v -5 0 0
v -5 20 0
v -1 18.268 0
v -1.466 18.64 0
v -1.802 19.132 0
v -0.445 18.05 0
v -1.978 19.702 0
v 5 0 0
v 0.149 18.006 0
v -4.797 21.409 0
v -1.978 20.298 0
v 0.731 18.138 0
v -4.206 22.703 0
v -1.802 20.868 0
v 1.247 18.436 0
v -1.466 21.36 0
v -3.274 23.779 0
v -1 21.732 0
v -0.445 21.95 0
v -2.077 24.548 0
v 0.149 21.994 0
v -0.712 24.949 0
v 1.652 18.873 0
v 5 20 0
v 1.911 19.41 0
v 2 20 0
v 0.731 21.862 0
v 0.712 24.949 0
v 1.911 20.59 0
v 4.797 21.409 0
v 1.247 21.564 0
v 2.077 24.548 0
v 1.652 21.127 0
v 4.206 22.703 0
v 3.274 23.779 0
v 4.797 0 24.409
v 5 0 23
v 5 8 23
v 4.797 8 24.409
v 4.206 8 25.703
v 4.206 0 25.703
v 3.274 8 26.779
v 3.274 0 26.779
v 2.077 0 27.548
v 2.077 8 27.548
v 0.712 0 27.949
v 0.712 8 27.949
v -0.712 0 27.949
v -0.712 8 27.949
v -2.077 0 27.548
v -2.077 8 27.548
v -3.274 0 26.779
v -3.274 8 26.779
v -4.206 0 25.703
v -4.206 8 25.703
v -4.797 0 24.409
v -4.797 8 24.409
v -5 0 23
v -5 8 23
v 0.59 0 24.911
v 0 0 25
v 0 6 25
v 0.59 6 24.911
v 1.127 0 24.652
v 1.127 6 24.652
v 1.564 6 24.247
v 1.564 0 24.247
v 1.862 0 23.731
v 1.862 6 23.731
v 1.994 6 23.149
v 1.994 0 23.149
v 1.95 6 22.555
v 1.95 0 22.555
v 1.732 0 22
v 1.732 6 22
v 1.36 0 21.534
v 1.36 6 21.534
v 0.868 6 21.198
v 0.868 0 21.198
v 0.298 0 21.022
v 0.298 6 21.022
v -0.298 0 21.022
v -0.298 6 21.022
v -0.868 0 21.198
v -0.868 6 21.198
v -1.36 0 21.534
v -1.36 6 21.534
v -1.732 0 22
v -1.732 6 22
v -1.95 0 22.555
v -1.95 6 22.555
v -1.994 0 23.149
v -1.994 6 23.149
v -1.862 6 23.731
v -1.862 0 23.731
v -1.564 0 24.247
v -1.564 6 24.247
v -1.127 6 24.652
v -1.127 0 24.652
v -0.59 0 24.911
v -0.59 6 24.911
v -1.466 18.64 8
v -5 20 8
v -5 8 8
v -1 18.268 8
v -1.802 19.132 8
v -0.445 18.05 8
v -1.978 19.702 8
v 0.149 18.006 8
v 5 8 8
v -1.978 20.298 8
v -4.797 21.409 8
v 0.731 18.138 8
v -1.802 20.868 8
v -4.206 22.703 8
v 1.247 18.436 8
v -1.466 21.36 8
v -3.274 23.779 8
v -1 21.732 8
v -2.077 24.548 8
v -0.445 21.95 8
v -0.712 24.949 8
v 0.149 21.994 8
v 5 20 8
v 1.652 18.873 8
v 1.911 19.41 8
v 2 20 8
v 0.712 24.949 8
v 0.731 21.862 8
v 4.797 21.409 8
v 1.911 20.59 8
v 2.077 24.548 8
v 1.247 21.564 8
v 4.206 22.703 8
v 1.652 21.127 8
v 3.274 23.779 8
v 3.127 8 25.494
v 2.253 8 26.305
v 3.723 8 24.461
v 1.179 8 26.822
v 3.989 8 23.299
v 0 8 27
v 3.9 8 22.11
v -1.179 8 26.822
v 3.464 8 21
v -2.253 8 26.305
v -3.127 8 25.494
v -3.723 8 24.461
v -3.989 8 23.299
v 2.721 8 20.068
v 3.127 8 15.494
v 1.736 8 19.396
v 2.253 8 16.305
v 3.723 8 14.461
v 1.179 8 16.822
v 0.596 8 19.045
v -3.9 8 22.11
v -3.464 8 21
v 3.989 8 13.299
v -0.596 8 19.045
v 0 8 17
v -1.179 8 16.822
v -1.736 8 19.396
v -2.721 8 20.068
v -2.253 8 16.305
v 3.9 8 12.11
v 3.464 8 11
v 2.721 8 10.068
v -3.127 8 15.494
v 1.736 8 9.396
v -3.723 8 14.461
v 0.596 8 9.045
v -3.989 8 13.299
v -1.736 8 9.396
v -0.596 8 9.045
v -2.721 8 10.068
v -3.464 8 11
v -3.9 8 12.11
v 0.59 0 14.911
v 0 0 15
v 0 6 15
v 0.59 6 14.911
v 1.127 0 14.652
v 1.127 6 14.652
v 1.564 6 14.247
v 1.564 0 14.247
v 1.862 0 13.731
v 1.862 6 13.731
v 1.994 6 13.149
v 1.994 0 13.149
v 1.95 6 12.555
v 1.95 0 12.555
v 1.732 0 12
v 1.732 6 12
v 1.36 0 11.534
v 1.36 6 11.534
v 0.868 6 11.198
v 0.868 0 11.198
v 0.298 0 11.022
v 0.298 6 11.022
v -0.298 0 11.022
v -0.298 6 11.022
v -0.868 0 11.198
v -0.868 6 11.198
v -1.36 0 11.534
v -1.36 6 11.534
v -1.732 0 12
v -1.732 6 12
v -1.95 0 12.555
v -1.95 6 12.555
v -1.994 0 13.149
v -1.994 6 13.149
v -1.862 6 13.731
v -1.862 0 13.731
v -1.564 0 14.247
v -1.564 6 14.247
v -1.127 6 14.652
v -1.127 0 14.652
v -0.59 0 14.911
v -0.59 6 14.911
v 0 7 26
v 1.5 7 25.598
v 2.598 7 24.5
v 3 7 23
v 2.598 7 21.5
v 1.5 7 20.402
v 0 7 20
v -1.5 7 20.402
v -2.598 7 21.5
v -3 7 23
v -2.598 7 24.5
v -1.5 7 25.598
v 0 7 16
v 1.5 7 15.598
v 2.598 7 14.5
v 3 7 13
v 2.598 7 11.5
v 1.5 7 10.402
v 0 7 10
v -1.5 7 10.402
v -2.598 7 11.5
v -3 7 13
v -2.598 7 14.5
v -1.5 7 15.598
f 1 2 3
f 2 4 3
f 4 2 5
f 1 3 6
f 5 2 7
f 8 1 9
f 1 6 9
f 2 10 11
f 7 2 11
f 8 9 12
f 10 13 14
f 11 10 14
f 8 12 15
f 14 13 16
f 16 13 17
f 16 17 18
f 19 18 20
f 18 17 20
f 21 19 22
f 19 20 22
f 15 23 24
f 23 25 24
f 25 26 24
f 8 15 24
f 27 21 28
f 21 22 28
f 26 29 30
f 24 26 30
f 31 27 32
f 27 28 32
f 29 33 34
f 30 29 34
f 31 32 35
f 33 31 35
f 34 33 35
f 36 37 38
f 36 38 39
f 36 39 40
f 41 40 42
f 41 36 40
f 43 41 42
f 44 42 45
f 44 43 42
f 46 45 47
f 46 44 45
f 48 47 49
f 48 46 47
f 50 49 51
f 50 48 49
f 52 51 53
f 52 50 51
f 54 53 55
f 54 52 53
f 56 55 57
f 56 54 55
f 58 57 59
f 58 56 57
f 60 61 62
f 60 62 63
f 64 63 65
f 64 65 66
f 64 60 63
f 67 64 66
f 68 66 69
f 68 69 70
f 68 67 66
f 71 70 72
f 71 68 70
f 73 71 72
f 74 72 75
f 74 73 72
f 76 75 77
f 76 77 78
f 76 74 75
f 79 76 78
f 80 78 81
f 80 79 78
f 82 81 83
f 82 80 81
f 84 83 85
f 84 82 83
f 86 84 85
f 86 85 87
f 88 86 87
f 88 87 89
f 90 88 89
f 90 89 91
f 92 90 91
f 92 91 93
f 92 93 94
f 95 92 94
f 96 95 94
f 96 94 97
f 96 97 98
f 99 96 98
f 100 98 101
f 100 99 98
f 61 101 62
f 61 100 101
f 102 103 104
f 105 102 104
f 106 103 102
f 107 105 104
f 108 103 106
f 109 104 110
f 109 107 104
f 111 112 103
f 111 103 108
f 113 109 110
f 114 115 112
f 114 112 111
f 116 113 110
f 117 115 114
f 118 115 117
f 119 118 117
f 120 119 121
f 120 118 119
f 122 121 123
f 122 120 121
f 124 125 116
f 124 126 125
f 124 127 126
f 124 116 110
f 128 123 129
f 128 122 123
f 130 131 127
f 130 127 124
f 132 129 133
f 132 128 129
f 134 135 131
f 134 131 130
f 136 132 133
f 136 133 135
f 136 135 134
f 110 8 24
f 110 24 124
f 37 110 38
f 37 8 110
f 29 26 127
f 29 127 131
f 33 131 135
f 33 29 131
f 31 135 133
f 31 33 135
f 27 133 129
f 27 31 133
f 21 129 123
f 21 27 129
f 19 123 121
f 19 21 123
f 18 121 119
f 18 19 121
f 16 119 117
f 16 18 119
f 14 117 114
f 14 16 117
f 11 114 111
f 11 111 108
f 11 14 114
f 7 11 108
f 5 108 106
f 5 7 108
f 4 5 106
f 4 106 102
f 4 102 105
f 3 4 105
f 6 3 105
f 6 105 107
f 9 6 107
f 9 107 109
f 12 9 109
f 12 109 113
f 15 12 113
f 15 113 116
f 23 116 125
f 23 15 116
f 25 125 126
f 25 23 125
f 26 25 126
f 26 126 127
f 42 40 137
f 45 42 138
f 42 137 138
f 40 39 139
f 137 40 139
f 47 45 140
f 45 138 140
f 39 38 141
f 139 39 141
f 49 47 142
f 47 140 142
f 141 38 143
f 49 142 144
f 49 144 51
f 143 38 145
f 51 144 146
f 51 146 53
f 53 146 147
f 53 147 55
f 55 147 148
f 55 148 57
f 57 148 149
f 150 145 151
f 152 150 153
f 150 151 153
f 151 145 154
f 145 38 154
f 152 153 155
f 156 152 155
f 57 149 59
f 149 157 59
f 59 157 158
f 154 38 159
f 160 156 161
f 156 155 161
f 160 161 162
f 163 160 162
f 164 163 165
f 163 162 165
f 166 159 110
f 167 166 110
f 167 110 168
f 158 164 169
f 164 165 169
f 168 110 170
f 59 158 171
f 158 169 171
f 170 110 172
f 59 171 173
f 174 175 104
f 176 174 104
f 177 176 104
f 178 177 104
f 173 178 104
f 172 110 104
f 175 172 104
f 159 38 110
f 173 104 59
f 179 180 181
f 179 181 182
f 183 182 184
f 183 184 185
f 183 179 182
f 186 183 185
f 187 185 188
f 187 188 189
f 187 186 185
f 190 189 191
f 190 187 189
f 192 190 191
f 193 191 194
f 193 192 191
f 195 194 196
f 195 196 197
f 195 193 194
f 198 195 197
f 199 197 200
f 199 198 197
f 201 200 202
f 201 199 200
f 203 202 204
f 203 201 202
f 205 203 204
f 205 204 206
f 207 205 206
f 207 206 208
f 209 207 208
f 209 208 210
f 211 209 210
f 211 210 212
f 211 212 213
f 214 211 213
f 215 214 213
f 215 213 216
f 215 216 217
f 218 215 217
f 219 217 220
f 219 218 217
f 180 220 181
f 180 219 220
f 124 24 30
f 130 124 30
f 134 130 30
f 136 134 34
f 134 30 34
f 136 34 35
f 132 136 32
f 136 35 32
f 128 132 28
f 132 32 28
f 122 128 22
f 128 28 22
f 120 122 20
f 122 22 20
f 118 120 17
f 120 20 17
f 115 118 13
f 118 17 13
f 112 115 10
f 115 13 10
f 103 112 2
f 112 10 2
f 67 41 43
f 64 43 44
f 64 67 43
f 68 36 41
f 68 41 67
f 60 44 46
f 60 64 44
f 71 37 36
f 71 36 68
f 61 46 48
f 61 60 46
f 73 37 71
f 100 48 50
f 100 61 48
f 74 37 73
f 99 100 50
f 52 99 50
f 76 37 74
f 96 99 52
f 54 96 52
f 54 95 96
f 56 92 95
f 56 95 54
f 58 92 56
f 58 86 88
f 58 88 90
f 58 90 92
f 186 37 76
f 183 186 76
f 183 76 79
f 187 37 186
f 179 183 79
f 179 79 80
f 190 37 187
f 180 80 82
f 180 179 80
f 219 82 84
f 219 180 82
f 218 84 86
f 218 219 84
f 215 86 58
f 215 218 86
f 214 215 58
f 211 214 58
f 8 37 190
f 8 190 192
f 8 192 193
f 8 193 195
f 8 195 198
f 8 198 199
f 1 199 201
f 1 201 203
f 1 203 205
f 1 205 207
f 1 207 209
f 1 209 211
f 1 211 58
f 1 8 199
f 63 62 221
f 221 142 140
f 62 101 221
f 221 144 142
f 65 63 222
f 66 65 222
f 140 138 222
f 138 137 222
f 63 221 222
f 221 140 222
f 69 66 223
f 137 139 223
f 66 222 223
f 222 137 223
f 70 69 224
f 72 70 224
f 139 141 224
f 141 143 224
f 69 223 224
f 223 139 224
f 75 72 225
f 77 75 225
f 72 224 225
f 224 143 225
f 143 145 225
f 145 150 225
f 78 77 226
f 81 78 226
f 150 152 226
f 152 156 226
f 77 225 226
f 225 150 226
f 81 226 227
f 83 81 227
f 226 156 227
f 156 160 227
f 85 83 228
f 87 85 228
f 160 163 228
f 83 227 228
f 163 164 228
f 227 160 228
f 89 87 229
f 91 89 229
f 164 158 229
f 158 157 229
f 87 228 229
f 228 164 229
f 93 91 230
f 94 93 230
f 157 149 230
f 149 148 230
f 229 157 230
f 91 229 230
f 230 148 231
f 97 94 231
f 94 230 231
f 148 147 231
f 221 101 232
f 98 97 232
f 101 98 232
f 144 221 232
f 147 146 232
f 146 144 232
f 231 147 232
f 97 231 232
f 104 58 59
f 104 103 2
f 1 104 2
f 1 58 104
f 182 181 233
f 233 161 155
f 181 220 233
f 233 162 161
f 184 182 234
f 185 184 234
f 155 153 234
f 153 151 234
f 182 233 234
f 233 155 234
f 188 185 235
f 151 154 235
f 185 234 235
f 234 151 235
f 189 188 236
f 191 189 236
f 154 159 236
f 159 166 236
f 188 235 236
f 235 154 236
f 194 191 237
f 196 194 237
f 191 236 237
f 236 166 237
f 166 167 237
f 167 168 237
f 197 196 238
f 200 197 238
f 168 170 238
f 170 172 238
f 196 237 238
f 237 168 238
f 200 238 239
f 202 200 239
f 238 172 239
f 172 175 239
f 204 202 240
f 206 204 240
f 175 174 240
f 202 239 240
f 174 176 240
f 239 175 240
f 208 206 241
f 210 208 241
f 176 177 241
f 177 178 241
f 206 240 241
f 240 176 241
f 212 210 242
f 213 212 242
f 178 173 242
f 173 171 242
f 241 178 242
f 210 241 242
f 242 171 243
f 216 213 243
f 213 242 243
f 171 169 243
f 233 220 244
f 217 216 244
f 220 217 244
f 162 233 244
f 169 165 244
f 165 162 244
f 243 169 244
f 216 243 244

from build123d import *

# Parameters (mm, degrees)
SKETCH_1_R      = 2
EXTRUDE_1_DEPTH = 8
SKETCH_2_R      = 2
EXTRUDE_2_DEPTH = 8
CHAMFER_1_SIZE  = 2


with BuildPart() as part:
    # 草图1 → 凸台-拉伸1 (new body)
    with BuildSketch(Plane.XY):
        with BuildLine():
            Line((-5, 20), (-5, 0))
            Line((-5, 0), (5, 0))
            Line((5, 0), (5, 20))
            ThreePointArc((5, 20), (0, 25), (-5, 20))
        make_face()
        with Locations((0, 20)):
            Circle(SKETCH_1_R, mode=Mode.SUBTRACT)
    extrude(amount=EXTRUDE_1_DEPTH)

    # 草图2 → 凸台-拉伸2 (add)
    with BuildSketch(Plane(origin=(0, 0, 0), x_dir=(1, 0, 0), z_dir=(0, 1, 0))):
        with BuildLine():
            Line((-5, -8), (5, -8))
            Line((5, -8), (5, -23))
            ThreePointArc((5, -23), (0, -28), (-5, -23))
            Line((-5, -23), (-5, -8))
        make_face()
        with Locations(Location((0, -23, 0), (0, 0, 270))):
            Circle(SKETCH_2_R, mode=Mode.SUBTRACT)
        with Locations(Location((0, -13, 0), (0, 0, 270))):
            Circle(SKETCH_2_R, mode=Mode.SUBTRACT)
    extrude(amount=EXTRUDE_2_DEPTH)

    # 倒角1
    chamfer_1_edges = [part.edges().sort_by_distance(p)[0] for p in [
        (0, 8, 21),
        (0, 8, 11),
    ]]
    chamfer(chamfer_1_edges, length=CHAMFER_1_SIZE)


solid = part.part
